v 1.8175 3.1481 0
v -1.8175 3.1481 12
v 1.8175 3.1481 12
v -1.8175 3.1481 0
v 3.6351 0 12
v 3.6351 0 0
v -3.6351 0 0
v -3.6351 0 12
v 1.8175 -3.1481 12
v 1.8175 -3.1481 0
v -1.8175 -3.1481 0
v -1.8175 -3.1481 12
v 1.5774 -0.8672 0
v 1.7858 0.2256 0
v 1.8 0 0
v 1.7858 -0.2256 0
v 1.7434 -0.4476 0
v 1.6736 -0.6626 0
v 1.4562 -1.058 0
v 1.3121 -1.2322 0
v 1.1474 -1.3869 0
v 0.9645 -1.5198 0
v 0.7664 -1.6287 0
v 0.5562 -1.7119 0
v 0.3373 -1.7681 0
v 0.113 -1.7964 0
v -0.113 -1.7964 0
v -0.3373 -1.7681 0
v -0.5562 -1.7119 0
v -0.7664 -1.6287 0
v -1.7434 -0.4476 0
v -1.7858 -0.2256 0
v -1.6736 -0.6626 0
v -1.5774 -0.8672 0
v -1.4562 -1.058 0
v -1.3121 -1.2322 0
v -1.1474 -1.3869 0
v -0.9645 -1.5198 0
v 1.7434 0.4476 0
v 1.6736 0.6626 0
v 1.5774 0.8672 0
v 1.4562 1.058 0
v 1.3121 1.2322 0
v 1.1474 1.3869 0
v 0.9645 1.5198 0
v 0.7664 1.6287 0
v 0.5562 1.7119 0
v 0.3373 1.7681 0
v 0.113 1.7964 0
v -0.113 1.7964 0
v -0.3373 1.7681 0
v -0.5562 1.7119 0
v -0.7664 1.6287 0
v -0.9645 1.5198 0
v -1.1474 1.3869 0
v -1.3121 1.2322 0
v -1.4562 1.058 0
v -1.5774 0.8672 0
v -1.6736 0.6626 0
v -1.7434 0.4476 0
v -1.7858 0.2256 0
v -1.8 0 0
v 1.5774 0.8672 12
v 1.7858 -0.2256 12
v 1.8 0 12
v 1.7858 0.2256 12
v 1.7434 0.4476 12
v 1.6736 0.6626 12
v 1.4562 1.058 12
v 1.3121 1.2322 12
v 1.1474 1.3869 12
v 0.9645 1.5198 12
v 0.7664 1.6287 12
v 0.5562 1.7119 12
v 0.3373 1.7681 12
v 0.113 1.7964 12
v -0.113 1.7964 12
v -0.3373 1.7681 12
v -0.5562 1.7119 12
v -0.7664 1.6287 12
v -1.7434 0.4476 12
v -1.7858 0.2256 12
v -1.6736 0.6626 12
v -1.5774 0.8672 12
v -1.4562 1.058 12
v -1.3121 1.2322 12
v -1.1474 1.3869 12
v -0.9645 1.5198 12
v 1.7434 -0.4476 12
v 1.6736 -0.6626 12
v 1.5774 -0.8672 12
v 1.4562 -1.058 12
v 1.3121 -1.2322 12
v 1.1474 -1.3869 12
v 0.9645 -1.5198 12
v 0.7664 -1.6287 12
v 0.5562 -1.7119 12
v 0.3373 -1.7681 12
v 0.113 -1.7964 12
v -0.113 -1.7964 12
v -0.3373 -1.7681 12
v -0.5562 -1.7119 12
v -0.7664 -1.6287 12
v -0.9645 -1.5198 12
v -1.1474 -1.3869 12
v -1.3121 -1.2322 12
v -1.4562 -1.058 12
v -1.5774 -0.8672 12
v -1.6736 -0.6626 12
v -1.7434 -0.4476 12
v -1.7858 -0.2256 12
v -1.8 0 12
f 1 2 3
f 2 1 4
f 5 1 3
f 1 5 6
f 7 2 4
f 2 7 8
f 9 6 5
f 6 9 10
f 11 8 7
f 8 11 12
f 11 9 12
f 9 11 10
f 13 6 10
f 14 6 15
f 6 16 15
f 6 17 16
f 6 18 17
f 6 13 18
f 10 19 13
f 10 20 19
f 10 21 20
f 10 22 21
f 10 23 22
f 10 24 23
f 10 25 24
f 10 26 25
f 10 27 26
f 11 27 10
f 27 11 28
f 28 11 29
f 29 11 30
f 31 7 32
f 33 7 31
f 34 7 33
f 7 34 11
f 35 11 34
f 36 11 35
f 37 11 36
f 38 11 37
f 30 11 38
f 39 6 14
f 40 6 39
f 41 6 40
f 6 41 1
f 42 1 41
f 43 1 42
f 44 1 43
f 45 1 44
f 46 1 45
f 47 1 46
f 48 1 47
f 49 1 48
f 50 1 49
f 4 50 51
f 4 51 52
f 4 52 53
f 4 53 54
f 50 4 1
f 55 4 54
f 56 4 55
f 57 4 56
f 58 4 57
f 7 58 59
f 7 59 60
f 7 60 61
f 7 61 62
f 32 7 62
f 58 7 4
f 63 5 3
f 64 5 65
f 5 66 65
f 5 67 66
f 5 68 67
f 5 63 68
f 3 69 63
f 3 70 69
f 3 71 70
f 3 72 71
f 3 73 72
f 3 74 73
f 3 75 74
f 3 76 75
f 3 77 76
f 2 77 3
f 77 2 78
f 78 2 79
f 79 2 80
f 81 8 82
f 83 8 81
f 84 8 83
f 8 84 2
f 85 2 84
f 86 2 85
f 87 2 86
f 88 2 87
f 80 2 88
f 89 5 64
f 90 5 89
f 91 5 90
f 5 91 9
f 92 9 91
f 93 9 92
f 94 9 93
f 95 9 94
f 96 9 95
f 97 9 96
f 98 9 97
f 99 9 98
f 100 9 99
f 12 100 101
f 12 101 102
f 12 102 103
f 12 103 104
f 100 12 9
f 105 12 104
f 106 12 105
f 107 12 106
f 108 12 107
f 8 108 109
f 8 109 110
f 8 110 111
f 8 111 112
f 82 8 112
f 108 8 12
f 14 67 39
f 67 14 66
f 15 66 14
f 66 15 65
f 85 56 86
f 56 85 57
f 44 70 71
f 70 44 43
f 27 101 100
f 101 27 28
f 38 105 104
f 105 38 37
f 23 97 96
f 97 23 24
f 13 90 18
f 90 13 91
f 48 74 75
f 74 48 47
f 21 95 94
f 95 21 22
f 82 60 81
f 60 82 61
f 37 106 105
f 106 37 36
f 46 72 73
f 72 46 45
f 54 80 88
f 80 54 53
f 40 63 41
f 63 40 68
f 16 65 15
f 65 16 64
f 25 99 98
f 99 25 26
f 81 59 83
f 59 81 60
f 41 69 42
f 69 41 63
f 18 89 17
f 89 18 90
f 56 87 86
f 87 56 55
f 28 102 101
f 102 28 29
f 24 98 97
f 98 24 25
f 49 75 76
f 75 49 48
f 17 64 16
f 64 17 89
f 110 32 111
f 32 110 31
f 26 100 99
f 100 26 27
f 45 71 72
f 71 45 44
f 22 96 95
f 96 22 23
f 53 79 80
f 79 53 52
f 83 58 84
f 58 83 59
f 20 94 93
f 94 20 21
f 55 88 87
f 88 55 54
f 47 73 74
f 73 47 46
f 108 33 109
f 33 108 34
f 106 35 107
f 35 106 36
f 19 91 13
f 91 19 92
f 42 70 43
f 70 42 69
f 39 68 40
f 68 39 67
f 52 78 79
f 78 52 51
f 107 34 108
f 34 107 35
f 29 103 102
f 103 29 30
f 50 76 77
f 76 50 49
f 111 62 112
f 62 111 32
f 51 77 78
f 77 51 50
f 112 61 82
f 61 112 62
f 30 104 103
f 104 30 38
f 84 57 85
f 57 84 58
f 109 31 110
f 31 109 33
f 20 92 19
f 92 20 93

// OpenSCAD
$fn = 50;


difference() {
	union() {
		linear_extrude(height = 12) {
			polygon(points = [[3.6351000000, 0.0000000000], [1.8175500000, 3.1480889453], [-1.8175500000, 3.1480889453], [-3.6351000000, 0.0000000000], [-1.8175500000, -3.1480889453], [1.8175500000, -3.1480889453]]);
		}
	}
	union() {
		cylinder(h = 12, r = 1.8000000000);
	}
}
